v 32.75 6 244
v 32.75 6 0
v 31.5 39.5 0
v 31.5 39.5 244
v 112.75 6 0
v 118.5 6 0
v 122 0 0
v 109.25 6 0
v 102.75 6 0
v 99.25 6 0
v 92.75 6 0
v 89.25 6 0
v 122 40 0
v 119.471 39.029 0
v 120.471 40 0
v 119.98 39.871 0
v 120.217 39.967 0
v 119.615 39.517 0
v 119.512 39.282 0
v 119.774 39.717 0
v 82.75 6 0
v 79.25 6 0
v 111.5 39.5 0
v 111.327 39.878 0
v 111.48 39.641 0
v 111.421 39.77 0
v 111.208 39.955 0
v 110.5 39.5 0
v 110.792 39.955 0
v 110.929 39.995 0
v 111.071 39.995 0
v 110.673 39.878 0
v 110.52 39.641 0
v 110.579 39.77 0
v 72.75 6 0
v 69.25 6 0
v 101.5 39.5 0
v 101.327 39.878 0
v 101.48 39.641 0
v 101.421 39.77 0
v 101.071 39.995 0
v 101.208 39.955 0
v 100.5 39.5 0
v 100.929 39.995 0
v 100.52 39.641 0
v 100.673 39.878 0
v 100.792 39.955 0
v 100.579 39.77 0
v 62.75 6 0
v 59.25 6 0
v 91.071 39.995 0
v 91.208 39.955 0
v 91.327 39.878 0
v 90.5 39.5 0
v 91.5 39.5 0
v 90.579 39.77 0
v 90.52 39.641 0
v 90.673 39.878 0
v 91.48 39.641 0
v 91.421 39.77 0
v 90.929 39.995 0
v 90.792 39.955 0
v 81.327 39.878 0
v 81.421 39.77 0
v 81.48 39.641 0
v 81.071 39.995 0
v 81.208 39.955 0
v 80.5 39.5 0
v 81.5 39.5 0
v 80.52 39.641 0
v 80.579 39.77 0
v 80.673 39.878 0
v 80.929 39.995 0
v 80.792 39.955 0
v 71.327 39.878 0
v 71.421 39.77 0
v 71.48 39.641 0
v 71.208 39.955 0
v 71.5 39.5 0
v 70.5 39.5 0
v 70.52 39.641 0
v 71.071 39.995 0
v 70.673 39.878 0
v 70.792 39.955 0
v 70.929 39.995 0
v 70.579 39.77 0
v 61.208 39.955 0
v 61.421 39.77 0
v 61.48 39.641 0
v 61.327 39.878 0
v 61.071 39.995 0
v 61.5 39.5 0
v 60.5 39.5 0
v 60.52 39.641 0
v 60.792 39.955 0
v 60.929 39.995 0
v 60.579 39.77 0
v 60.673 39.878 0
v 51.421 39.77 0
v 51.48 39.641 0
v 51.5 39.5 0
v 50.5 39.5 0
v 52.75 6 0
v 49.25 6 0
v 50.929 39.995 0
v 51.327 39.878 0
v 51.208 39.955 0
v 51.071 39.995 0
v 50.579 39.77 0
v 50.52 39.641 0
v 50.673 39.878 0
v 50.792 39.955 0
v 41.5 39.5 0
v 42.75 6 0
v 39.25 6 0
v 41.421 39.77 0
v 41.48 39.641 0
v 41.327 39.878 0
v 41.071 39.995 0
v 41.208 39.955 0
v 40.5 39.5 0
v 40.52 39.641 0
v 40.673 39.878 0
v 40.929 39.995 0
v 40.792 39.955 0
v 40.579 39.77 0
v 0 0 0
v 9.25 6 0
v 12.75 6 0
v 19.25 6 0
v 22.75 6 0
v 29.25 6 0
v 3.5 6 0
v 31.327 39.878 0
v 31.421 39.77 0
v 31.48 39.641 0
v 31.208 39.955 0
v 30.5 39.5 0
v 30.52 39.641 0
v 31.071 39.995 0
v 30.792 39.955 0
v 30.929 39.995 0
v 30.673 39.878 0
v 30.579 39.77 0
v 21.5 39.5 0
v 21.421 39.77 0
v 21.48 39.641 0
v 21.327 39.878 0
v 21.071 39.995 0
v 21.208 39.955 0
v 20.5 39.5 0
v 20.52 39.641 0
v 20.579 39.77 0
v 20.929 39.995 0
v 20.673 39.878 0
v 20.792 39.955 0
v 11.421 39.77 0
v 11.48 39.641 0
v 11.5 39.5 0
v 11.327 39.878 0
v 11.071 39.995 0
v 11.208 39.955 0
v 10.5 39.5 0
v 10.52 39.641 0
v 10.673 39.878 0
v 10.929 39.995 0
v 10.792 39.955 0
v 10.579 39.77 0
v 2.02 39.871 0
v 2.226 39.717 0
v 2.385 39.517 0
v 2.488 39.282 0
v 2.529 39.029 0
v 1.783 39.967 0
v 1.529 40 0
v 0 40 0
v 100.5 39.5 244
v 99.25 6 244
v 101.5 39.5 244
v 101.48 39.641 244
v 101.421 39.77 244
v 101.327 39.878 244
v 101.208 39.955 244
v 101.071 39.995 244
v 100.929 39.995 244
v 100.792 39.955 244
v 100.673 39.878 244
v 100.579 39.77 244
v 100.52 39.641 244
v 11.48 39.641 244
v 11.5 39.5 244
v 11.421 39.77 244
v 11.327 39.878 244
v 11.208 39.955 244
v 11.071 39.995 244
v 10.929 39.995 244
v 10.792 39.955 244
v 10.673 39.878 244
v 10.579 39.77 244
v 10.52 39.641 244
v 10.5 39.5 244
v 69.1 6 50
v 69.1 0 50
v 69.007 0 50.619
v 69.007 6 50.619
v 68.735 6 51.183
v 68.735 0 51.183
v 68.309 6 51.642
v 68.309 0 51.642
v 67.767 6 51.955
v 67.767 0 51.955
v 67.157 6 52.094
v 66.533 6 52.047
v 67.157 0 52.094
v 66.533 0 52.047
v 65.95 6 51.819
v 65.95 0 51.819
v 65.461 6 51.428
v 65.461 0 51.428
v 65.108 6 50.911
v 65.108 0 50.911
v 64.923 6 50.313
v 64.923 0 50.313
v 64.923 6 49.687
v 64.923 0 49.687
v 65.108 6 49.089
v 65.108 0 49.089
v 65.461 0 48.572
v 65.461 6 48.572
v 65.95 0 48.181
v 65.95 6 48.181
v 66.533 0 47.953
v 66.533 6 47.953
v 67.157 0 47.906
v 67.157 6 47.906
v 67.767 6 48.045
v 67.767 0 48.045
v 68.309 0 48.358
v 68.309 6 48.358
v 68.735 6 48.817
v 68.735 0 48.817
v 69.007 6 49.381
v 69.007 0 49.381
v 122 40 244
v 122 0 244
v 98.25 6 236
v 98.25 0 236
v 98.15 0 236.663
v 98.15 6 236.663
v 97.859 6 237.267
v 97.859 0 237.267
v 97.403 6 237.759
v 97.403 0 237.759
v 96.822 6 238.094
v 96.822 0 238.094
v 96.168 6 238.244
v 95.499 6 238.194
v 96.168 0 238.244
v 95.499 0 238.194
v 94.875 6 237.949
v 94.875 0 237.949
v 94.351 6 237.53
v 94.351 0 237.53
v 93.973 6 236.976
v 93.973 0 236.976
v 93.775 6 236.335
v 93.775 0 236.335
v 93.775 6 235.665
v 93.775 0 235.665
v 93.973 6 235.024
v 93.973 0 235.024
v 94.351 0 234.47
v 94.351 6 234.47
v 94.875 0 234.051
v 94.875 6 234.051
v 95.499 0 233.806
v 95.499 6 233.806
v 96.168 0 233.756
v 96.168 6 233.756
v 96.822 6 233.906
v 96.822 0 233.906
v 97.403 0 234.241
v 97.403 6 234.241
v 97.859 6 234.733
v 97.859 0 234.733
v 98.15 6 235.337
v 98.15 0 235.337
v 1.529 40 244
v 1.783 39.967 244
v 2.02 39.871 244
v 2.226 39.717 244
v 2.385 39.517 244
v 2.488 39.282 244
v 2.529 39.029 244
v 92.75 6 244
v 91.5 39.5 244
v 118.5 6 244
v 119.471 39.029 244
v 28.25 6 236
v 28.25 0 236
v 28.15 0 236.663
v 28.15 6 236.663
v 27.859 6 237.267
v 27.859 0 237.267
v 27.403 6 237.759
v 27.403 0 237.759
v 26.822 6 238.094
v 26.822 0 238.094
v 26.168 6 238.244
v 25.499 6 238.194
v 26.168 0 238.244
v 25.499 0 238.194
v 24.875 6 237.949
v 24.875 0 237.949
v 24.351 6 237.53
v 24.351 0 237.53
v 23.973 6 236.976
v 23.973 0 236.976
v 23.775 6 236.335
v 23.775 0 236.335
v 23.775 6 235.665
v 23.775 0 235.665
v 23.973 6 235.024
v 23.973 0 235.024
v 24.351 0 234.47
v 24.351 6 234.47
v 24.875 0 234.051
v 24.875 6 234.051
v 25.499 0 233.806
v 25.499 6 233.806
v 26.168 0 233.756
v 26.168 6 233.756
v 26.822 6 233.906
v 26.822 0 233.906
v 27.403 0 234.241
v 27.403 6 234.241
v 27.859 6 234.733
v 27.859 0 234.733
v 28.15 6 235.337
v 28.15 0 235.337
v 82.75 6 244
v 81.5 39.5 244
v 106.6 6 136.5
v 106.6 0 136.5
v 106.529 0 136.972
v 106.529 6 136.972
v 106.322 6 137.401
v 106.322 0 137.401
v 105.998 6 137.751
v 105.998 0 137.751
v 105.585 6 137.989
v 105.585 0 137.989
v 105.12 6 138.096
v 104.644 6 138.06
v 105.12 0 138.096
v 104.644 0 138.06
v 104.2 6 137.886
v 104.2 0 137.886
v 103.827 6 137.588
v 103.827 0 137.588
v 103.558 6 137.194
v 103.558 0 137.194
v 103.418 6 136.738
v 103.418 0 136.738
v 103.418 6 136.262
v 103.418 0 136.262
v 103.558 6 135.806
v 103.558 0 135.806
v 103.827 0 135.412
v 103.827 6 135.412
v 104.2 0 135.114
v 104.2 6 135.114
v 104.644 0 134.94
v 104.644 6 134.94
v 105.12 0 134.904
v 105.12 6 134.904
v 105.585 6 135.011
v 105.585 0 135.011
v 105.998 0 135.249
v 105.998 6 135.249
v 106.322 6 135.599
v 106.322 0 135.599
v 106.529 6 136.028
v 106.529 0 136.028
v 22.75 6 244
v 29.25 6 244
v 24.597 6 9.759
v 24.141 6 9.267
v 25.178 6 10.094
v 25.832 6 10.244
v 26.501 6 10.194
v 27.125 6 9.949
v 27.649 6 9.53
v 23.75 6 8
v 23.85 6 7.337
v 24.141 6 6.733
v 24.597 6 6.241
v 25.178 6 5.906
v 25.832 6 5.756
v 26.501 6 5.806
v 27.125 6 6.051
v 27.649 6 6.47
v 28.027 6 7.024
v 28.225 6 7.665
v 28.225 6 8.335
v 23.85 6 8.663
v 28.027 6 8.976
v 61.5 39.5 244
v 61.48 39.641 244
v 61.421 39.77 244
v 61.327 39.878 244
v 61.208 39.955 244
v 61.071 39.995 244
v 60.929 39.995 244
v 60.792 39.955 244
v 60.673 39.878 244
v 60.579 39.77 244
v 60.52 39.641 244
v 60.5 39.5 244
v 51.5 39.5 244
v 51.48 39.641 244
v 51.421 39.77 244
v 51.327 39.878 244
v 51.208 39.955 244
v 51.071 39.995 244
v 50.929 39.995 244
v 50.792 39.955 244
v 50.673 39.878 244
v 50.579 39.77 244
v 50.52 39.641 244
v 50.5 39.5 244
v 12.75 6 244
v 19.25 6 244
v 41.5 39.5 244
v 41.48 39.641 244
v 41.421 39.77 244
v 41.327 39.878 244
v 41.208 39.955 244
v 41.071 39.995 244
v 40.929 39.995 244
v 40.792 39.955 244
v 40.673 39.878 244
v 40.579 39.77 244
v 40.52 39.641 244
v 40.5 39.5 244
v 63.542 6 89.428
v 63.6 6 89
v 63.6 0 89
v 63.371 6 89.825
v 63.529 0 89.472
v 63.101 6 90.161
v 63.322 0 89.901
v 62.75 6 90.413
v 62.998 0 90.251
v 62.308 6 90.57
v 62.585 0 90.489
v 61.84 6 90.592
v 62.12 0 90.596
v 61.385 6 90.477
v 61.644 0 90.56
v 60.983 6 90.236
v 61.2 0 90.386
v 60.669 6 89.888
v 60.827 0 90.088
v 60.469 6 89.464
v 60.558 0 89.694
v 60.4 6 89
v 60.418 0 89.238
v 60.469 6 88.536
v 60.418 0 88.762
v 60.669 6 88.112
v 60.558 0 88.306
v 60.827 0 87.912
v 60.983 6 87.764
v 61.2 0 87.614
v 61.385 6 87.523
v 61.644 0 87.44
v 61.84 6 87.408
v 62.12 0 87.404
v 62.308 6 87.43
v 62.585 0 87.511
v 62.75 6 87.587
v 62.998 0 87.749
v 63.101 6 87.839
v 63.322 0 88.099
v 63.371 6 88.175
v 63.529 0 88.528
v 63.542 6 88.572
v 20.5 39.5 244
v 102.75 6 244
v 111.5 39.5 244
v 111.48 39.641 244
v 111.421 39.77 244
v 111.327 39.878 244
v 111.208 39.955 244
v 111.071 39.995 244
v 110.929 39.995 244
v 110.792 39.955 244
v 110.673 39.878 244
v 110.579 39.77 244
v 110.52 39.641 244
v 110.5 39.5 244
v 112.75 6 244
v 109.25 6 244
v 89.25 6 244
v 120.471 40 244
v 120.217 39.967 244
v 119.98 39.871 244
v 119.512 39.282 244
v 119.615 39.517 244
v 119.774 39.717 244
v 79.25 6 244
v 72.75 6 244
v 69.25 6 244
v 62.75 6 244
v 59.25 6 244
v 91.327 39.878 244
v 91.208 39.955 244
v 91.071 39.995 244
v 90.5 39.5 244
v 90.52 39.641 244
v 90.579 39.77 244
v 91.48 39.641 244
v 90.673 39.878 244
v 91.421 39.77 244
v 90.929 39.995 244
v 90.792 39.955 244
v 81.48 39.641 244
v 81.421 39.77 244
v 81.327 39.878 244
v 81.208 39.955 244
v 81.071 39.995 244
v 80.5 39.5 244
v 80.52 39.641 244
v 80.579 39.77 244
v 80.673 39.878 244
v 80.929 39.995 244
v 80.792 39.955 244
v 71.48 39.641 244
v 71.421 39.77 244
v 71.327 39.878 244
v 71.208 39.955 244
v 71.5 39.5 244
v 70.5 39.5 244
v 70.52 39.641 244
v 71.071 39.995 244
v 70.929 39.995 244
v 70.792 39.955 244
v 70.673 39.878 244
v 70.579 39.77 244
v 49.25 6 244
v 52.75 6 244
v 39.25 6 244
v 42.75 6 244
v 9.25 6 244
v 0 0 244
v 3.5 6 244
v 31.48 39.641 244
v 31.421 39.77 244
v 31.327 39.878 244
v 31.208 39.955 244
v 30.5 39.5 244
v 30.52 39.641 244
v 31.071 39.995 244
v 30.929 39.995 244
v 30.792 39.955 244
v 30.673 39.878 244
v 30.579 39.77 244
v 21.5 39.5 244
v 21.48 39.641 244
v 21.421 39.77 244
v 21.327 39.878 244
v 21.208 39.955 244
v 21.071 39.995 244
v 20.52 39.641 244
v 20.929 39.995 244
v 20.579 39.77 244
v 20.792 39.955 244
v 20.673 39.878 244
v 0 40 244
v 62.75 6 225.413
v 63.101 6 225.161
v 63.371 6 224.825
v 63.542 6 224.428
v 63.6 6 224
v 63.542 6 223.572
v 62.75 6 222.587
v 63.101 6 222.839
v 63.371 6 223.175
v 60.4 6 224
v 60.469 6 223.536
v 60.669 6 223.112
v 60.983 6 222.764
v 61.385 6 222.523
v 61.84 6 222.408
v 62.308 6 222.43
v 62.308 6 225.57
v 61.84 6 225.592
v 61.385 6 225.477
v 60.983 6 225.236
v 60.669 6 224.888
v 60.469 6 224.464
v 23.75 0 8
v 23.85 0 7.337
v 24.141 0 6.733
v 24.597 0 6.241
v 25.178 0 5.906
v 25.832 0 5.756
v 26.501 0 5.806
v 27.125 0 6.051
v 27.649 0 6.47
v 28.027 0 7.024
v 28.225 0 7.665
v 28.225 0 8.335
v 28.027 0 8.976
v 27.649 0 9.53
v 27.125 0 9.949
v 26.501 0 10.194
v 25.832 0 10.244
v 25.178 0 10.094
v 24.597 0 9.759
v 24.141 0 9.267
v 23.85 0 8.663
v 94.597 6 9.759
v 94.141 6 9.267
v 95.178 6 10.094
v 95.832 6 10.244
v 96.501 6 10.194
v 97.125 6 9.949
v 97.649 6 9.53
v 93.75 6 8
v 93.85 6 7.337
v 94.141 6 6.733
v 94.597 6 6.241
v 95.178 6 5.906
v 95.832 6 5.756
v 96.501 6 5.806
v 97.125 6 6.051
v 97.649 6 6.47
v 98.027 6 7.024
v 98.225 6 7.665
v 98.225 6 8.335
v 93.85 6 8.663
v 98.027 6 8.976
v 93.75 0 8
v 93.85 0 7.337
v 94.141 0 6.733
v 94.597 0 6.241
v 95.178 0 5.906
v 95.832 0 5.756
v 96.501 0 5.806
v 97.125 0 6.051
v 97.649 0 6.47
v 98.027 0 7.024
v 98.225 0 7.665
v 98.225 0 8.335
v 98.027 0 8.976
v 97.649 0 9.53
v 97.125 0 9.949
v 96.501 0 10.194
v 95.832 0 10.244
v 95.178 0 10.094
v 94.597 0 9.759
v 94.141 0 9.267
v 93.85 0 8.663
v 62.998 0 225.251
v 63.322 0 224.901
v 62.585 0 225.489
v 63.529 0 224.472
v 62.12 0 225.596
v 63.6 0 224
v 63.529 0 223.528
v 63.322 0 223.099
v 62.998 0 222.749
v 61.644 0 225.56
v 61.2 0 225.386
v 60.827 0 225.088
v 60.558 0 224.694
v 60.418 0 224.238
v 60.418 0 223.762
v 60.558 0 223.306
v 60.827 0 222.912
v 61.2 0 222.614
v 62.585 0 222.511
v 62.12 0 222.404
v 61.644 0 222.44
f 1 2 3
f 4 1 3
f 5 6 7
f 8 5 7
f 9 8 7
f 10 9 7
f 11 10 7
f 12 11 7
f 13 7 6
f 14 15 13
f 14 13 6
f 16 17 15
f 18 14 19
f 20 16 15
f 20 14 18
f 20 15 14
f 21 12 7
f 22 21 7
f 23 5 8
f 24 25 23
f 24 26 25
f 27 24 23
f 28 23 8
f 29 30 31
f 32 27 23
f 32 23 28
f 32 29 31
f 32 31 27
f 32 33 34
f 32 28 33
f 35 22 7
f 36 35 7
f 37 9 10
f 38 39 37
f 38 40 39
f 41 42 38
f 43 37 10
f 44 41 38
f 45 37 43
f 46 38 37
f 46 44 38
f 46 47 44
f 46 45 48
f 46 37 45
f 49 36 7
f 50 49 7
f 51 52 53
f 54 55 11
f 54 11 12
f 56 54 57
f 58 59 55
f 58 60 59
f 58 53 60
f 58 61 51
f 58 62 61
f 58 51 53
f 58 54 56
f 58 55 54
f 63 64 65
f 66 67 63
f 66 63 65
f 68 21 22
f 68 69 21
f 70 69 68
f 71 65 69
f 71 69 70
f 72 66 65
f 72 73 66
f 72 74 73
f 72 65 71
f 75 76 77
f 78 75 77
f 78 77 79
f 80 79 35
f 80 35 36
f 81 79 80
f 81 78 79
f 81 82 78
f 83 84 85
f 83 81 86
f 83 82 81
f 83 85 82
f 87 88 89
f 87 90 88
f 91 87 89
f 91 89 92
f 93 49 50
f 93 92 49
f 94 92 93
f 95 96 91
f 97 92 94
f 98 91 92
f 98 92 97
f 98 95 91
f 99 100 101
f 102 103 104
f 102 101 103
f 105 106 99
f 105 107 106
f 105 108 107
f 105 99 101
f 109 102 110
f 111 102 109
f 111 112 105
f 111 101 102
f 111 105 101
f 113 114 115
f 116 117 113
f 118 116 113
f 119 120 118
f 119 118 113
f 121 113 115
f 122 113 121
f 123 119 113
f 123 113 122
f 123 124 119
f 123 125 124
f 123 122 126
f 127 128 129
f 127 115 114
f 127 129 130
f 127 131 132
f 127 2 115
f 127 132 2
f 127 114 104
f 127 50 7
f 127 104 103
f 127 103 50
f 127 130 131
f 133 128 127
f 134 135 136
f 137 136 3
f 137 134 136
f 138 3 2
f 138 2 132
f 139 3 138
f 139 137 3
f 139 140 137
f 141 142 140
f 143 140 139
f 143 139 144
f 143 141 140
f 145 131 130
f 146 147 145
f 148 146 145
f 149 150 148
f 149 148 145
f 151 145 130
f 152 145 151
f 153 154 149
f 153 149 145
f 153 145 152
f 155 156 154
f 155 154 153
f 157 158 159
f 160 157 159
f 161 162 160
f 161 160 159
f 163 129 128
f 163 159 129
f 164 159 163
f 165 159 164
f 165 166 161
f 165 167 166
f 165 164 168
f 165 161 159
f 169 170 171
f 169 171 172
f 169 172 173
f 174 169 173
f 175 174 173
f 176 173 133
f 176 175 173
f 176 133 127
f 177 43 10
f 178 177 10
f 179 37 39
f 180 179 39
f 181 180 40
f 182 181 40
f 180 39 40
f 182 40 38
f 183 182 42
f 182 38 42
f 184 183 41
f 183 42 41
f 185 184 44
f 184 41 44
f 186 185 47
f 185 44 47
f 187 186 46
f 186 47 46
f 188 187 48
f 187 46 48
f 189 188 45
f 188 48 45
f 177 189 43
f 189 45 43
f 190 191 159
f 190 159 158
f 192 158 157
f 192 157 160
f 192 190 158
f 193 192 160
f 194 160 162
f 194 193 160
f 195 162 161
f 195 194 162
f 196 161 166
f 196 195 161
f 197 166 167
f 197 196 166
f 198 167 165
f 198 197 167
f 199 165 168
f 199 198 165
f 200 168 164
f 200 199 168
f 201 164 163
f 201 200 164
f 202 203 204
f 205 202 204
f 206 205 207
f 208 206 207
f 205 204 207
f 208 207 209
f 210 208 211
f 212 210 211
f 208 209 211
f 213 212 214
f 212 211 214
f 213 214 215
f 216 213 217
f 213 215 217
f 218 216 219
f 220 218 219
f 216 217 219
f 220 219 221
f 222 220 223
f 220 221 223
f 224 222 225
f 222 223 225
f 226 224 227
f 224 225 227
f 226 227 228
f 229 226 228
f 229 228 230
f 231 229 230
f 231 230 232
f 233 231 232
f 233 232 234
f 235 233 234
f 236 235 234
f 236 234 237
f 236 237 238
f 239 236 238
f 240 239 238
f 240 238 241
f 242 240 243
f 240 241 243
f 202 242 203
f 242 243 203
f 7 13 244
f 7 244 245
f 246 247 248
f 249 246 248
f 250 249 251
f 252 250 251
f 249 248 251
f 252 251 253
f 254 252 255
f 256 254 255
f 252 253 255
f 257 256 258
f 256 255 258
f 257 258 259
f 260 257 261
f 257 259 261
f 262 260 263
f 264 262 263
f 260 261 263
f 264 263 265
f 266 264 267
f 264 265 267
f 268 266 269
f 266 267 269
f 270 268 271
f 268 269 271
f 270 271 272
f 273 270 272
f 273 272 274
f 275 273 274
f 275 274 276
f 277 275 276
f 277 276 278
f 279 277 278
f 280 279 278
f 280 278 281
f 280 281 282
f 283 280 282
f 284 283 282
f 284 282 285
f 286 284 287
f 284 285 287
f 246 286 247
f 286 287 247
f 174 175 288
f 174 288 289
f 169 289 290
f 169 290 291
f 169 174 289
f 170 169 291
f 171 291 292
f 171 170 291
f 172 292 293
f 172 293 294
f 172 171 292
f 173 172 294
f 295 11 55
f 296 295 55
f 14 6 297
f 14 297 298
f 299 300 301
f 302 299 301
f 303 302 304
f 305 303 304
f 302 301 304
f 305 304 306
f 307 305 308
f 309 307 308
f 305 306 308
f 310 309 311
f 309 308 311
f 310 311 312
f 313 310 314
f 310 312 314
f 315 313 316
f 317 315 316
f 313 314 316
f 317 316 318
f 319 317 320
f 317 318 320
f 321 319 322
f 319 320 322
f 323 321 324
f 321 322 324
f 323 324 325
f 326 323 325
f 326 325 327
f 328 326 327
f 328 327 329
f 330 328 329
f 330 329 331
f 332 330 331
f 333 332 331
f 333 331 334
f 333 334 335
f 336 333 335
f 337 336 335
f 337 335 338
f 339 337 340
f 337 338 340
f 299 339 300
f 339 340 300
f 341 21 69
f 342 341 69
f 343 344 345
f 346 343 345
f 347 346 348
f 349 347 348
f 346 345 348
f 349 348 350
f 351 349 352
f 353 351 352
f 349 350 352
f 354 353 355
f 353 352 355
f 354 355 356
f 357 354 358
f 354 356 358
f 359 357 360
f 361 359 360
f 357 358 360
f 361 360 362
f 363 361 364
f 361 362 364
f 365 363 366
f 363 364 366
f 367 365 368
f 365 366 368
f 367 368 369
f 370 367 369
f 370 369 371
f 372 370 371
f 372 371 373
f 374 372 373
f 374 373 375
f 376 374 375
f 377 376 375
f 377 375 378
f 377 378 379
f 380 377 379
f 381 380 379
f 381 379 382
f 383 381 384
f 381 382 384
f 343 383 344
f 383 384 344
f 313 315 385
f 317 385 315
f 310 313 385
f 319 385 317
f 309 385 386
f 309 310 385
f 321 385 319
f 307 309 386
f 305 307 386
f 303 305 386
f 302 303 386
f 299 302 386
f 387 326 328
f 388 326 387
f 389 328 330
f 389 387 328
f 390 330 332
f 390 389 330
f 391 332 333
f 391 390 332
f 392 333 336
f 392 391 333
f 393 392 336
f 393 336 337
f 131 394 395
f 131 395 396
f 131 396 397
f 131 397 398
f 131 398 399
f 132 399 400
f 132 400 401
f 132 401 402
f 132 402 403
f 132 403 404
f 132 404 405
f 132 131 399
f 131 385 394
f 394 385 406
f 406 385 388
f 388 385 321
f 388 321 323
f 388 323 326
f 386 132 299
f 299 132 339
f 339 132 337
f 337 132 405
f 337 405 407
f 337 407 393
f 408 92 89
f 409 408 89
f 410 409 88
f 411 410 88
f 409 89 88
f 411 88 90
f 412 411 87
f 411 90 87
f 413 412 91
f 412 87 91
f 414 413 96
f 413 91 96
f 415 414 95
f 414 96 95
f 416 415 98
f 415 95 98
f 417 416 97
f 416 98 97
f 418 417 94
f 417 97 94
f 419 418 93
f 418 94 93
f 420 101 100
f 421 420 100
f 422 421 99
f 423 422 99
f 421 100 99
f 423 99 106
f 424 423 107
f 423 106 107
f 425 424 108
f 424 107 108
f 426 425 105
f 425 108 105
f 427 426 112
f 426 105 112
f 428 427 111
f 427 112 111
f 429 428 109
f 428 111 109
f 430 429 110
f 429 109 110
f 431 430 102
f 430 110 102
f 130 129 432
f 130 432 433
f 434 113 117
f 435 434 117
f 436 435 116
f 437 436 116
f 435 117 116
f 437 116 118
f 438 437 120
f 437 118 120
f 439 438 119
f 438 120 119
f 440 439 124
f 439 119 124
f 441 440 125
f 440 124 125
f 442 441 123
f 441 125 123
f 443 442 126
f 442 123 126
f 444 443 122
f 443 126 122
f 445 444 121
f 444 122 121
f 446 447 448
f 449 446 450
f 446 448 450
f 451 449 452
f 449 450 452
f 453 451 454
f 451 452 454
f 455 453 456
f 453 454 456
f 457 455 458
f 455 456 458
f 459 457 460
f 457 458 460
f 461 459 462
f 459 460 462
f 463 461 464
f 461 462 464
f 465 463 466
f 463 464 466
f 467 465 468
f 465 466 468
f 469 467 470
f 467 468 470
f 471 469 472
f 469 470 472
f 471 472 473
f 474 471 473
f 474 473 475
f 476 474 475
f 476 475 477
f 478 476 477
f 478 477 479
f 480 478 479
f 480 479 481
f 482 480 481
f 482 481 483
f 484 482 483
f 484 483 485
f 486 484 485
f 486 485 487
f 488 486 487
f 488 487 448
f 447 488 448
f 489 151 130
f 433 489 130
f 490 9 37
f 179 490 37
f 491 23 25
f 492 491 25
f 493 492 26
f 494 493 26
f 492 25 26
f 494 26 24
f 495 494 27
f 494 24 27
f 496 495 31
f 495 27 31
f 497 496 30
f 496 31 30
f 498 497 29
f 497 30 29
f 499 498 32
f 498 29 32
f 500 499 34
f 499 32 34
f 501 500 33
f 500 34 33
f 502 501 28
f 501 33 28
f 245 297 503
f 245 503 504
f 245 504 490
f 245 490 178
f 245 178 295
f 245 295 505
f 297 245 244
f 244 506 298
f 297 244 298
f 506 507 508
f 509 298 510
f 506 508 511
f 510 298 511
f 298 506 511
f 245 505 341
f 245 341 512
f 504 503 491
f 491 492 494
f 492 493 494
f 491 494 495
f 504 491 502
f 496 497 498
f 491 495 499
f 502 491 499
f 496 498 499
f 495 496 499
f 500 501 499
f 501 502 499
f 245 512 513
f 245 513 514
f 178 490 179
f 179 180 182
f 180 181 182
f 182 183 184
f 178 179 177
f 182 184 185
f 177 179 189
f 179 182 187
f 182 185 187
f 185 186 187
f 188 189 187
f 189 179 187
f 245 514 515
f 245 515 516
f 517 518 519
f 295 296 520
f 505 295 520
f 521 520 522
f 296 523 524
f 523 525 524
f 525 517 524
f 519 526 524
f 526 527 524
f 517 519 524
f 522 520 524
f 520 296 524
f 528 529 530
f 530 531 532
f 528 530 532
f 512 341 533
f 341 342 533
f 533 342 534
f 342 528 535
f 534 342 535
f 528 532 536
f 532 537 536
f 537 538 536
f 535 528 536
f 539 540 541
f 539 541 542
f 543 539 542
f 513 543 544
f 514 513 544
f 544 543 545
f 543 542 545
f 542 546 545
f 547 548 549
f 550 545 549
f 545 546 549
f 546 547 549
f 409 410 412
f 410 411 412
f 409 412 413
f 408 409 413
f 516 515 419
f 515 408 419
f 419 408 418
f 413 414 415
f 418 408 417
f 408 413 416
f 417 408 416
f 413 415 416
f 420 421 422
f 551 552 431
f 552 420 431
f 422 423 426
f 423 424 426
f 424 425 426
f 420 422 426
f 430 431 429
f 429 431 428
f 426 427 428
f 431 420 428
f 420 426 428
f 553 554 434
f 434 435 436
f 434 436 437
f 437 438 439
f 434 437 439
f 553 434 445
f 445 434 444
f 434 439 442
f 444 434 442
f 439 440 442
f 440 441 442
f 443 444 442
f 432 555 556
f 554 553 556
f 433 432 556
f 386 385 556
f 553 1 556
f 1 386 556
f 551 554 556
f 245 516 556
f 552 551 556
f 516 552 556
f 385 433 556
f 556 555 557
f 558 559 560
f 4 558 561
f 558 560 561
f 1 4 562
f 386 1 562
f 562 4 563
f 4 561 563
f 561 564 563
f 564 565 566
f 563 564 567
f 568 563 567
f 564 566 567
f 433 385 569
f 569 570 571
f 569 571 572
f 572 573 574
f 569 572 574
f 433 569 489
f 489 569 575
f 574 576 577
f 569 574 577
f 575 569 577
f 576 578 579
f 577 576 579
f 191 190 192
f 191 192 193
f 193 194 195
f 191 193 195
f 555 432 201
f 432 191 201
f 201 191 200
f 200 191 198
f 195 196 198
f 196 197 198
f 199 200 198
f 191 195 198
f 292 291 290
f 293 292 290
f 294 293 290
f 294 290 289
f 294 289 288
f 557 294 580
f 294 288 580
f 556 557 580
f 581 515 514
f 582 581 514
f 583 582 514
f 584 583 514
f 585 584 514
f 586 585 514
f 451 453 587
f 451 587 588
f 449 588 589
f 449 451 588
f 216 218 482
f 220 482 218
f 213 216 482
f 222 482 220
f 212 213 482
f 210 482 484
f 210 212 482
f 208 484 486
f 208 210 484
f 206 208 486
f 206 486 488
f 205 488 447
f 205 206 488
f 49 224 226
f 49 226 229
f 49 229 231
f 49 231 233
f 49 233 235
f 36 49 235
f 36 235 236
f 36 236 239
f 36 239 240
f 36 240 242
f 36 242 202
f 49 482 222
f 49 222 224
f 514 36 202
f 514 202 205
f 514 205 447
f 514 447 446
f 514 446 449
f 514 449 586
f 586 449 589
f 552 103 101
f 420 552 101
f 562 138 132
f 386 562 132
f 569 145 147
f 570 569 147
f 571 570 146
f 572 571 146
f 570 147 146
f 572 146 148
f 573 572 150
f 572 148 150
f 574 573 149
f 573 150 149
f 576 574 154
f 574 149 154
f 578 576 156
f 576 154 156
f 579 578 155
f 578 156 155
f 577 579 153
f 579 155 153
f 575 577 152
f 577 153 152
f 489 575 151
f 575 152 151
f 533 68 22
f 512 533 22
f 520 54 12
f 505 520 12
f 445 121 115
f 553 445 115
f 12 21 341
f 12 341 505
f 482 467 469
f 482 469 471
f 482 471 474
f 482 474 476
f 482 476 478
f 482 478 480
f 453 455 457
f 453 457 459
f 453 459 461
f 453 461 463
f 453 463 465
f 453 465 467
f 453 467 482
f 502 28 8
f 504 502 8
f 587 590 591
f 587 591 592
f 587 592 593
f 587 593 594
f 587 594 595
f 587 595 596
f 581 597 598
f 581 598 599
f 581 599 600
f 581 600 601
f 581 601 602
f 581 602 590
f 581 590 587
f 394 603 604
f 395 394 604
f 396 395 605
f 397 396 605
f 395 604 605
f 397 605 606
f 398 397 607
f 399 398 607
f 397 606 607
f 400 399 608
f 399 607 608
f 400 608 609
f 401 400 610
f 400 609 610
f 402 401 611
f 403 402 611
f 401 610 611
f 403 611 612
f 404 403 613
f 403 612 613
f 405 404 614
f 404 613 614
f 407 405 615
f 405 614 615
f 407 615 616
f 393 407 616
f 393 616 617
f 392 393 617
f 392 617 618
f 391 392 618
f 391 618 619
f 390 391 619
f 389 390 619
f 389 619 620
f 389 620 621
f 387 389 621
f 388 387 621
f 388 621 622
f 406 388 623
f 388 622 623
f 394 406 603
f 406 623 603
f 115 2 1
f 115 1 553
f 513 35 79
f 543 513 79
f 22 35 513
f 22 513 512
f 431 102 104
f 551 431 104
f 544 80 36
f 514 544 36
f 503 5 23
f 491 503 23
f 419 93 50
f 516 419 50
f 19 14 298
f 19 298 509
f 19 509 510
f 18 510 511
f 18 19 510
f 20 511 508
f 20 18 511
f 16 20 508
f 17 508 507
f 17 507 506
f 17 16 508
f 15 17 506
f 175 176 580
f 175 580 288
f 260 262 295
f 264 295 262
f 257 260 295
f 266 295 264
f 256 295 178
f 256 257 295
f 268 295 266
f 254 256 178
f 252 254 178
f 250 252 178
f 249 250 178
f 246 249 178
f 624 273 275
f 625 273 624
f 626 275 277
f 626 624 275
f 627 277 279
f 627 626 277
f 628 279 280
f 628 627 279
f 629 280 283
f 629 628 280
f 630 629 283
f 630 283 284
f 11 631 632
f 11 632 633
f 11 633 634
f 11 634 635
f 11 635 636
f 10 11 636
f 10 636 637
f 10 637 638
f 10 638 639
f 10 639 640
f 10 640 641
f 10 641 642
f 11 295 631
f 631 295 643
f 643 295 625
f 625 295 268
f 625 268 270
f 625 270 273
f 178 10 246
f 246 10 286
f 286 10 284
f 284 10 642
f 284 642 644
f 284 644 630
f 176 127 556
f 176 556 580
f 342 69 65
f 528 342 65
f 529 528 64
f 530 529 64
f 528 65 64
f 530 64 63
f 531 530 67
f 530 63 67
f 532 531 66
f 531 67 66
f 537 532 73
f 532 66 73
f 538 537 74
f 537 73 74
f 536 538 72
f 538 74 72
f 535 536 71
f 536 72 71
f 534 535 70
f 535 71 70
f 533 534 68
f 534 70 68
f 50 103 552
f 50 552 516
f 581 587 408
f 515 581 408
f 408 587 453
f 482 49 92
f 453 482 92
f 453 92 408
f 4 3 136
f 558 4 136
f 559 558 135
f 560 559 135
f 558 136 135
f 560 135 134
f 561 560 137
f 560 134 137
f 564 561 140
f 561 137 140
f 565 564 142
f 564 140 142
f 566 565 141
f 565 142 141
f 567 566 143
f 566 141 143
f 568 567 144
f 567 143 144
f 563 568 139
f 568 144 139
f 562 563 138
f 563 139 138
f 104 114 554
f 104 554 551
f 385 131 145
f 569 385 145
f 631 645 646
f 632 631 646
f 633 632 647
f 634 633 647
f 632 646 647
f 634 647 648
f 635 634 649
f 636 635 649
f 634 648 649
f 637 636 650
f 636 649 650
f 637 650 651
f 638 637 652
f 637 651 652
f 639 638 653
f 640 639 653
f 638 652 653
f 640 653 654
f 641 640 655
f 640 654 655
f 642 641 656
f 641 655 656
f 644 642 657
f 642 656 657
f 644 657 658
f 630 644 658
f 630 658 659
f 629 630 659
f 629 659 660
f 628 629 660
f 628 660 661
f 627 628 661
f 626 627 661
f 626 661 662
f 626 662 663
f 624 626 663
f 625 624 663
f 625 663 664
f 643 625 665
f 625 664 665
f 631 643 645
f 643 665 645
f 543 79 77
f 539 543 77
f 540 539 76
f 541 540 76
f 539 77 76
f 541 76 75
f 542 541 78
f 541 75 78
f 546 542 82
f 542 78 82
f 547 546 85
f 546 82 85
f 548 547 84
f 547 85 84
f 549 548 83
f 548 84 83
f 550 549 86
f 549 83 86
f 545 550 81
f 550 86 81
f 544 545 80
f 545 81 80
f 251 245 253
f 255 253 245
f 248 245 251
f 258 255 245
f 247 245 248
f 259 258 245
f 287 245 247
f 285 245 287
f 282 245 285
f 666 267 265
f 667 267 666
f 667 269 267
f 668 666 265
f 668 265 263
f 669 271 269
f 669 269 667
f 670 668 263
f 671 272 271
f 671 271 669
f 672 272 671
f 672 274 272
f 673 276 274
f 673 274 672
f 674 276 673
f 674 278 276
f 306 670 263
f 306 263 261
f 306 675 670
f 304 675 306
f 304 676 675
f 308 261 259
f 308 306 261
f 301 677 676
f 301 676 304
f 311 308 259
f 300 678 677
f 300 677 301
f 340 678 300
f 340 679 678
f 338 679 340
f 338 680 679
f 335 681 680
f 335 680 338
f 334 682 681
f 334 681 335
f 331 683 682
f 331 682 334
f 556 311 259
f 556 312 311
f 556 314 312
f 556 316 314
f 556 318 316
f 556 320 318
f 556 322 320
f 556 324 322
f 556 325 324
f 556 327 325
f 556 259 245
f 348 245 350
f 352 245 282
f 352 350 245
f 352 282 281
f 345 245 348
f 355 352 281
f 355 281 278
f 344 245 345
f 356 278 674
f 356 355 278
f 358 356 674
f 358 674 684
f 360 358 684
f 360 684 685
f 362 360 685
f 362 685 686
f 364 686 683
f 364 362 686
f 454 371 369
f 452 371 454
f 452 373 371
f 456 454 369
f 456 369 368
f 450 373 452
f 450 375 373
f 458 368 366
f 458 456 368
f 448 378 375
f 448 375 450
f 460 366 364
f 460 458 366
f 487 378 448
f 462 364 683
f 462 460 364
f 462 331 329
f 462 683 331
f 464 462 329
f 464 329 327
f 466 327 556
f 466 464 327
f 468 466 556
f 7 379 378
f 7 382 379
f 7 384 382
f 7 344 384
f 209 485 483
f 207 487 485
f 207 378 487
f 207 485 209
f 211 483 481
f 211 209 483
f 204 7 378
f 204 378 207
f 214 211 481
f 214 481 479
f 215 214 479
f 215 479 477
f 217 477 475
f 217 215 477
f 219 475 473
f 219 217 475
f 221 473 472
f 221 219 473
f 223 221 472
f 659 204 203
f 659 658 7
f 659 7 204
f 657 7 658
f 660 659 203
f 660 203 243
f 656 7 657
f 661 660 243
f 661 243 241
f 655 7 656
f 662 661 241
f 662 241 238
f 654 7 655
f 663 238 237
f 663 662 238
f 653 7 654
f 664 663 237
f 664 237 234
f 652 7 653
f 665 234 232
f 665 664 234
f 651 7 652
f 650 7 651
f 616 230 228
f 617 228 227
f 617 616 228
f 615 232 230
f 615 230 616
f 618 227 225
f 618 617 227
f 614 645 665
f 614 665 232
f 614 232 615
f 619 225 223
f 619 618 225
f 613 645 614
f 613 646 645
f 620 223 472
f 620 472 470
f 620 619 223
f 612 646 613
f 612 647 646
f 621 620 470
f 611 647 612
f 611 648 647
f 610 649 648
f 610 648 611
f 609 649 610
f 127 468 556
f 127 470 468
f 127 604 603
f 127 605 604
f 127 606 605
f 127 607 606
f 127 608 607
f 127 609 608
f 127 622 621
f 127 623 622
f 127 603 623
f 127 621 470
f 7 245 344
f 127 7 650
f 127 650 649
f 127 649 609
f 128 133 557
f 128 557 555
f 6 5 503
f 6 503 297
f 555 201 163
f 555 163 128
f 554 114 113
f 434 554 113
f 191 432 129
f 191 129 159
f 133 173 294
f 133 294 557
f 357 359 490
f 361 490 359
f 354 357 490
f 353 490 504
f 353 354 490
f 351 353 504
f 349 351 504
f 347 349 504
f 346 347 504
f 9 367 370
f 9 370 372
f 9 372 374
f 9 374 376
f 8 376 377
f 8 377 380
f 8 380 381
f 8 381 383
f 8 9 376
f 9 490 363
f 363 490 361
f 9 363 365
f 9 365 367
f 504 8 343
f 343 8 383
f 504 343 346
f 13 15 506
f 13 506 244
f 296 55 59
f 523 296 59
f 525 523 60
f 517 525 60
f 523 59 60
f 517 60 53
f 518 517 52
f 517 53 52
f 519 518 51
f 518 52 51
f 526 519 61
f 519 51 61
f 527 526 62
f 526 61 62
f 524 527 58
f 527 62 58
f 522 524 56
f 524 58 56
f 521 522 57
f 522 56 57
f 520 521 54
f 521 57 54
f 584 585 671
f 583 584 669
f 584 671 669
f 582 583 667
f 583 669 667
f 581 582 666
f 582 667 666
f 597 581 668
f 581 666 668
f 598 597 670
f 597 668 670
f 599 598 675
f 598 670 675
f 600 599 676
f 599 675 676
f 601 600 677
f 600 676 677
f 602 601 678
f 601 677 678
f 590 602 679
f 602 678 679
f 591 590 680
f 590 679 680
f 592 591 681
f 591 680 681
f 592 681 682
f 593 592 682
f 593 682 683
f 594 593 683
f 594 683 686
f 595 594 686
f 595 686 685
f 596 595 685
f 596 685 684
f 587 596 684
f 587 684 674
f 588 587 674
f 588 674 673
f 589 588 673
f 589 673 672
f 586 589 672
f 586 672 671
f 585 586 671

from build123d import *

# Parameters (mm, degrees)
EXTRUDE_1_DEPTH       = 244
EXTRUDE_3_DEPTH       = 244
PATTERN_CURVE_1_COUNT = 11
PATTERN_CURVE_1_PITCH = 10
SKETCH_3_R            = 2.25
CUT_EXTRUDE_1_DEPTH   = 6
SKETCH_4_R            = 2.1
SKETCH_4_R_2          = 1.6
CUT_EXTRUDE_2_DEPTH   = 6


with BuildPart() as part:
    # Эскиз1 → Вытянуть1 (new body)
    with BuildSketch(Plane.XY):
        with BuildLine():
            Line((0, 40), (1.528979332, 40))
            ThreePointArc((1.528979332, 40), (2.225614441, 39.717425624), (2.528547087, 39.029399052))
            Line((2.528547087, 39.029399052), (3.5, 6))
            Line((3.5, 6), (118.5, 6))
            Line((118.5, 6), (119.471452913, 39.029399052))
            ThreePointArc((119.471452913, 39.029399052), (119.774385559, 39.717425624), (120.471020668, 40))
            Line((120.471020668, 40), (122, 40))
            Line((122, 40), (122, 0))
            Line((122, 0), (0, 0))
            Line((0, 0), (0, 40))
        make_face()
    extrude(amount=EXTRUDE_1_DEPTH)

    # Эскиз2 → Вытянуть3 (add)
    with BuildSketch(Plane.XY.offset(244)):
        with BuildLine():
            Line((10.5, 39.5), (9.25, 6))
            Line((9.25, 6), (12.75, 6))
            Line((12.75, 6), (11.5, 39.5))
            ThreePointArc((11.5, 39.5), (11, 40), (10.5, 39.5))
        make_face()
    extrude_3 = extrude(amount=-EXTRUDE_3_DEPTH)

    # Кривая1: Вытянуть3 ×11
    with Locations(*[(i * PATTERN_CURVE_1_PITCH, 0, 0) for i in range(1, PATTERN_CURVE_1_COUNT)]):
        add(extrude_3)

    # Эскиз3 → Вырез-Вытянуть1 (cut)
    with BuildSketch(Plane.XZ):
        with Locations((26, 236)):
            Circle(SKETCH_3_R)
        with Locations((96, 236)):
            Circle(SKETCH_3_R)
        with Locations((96, 8)):
            Circle(SKETCH_3_R)
        with Locations((26, 8)):
            Circle(SKETCH_3_R)
    extrude(amount=-CUT_EXTRUDE_1_DEPTH, mode=Mode.SUBTRACT)

    # Эскиз4 → Вырез-Вытянуть2 (cut)
    with BuildSketch(Plane(origin=(1.487985642, 0, 27.400529356), x_dir=(1, 0, 0), z_dir=(0, -1, 0))):
        with Locations((65.512014358, 22.599470644)):
            Circle(SKETCH_4_R)
        with Locations((103.512014358, 109.099470644)):
            Circle(SKETCH_4_R_2)
        with Locations((60.512014358, 196.599470644)):
            Circle(SKETCH_4_R_2)
        with Locations((60.512014358, 61.599470644)):
            Circle(SKETCH_4_R_2)
    extrude(amount=-CUT_EXTRUDE_2_DEPTH, mode=Mode.SUBTRACT)


solid = part.part
